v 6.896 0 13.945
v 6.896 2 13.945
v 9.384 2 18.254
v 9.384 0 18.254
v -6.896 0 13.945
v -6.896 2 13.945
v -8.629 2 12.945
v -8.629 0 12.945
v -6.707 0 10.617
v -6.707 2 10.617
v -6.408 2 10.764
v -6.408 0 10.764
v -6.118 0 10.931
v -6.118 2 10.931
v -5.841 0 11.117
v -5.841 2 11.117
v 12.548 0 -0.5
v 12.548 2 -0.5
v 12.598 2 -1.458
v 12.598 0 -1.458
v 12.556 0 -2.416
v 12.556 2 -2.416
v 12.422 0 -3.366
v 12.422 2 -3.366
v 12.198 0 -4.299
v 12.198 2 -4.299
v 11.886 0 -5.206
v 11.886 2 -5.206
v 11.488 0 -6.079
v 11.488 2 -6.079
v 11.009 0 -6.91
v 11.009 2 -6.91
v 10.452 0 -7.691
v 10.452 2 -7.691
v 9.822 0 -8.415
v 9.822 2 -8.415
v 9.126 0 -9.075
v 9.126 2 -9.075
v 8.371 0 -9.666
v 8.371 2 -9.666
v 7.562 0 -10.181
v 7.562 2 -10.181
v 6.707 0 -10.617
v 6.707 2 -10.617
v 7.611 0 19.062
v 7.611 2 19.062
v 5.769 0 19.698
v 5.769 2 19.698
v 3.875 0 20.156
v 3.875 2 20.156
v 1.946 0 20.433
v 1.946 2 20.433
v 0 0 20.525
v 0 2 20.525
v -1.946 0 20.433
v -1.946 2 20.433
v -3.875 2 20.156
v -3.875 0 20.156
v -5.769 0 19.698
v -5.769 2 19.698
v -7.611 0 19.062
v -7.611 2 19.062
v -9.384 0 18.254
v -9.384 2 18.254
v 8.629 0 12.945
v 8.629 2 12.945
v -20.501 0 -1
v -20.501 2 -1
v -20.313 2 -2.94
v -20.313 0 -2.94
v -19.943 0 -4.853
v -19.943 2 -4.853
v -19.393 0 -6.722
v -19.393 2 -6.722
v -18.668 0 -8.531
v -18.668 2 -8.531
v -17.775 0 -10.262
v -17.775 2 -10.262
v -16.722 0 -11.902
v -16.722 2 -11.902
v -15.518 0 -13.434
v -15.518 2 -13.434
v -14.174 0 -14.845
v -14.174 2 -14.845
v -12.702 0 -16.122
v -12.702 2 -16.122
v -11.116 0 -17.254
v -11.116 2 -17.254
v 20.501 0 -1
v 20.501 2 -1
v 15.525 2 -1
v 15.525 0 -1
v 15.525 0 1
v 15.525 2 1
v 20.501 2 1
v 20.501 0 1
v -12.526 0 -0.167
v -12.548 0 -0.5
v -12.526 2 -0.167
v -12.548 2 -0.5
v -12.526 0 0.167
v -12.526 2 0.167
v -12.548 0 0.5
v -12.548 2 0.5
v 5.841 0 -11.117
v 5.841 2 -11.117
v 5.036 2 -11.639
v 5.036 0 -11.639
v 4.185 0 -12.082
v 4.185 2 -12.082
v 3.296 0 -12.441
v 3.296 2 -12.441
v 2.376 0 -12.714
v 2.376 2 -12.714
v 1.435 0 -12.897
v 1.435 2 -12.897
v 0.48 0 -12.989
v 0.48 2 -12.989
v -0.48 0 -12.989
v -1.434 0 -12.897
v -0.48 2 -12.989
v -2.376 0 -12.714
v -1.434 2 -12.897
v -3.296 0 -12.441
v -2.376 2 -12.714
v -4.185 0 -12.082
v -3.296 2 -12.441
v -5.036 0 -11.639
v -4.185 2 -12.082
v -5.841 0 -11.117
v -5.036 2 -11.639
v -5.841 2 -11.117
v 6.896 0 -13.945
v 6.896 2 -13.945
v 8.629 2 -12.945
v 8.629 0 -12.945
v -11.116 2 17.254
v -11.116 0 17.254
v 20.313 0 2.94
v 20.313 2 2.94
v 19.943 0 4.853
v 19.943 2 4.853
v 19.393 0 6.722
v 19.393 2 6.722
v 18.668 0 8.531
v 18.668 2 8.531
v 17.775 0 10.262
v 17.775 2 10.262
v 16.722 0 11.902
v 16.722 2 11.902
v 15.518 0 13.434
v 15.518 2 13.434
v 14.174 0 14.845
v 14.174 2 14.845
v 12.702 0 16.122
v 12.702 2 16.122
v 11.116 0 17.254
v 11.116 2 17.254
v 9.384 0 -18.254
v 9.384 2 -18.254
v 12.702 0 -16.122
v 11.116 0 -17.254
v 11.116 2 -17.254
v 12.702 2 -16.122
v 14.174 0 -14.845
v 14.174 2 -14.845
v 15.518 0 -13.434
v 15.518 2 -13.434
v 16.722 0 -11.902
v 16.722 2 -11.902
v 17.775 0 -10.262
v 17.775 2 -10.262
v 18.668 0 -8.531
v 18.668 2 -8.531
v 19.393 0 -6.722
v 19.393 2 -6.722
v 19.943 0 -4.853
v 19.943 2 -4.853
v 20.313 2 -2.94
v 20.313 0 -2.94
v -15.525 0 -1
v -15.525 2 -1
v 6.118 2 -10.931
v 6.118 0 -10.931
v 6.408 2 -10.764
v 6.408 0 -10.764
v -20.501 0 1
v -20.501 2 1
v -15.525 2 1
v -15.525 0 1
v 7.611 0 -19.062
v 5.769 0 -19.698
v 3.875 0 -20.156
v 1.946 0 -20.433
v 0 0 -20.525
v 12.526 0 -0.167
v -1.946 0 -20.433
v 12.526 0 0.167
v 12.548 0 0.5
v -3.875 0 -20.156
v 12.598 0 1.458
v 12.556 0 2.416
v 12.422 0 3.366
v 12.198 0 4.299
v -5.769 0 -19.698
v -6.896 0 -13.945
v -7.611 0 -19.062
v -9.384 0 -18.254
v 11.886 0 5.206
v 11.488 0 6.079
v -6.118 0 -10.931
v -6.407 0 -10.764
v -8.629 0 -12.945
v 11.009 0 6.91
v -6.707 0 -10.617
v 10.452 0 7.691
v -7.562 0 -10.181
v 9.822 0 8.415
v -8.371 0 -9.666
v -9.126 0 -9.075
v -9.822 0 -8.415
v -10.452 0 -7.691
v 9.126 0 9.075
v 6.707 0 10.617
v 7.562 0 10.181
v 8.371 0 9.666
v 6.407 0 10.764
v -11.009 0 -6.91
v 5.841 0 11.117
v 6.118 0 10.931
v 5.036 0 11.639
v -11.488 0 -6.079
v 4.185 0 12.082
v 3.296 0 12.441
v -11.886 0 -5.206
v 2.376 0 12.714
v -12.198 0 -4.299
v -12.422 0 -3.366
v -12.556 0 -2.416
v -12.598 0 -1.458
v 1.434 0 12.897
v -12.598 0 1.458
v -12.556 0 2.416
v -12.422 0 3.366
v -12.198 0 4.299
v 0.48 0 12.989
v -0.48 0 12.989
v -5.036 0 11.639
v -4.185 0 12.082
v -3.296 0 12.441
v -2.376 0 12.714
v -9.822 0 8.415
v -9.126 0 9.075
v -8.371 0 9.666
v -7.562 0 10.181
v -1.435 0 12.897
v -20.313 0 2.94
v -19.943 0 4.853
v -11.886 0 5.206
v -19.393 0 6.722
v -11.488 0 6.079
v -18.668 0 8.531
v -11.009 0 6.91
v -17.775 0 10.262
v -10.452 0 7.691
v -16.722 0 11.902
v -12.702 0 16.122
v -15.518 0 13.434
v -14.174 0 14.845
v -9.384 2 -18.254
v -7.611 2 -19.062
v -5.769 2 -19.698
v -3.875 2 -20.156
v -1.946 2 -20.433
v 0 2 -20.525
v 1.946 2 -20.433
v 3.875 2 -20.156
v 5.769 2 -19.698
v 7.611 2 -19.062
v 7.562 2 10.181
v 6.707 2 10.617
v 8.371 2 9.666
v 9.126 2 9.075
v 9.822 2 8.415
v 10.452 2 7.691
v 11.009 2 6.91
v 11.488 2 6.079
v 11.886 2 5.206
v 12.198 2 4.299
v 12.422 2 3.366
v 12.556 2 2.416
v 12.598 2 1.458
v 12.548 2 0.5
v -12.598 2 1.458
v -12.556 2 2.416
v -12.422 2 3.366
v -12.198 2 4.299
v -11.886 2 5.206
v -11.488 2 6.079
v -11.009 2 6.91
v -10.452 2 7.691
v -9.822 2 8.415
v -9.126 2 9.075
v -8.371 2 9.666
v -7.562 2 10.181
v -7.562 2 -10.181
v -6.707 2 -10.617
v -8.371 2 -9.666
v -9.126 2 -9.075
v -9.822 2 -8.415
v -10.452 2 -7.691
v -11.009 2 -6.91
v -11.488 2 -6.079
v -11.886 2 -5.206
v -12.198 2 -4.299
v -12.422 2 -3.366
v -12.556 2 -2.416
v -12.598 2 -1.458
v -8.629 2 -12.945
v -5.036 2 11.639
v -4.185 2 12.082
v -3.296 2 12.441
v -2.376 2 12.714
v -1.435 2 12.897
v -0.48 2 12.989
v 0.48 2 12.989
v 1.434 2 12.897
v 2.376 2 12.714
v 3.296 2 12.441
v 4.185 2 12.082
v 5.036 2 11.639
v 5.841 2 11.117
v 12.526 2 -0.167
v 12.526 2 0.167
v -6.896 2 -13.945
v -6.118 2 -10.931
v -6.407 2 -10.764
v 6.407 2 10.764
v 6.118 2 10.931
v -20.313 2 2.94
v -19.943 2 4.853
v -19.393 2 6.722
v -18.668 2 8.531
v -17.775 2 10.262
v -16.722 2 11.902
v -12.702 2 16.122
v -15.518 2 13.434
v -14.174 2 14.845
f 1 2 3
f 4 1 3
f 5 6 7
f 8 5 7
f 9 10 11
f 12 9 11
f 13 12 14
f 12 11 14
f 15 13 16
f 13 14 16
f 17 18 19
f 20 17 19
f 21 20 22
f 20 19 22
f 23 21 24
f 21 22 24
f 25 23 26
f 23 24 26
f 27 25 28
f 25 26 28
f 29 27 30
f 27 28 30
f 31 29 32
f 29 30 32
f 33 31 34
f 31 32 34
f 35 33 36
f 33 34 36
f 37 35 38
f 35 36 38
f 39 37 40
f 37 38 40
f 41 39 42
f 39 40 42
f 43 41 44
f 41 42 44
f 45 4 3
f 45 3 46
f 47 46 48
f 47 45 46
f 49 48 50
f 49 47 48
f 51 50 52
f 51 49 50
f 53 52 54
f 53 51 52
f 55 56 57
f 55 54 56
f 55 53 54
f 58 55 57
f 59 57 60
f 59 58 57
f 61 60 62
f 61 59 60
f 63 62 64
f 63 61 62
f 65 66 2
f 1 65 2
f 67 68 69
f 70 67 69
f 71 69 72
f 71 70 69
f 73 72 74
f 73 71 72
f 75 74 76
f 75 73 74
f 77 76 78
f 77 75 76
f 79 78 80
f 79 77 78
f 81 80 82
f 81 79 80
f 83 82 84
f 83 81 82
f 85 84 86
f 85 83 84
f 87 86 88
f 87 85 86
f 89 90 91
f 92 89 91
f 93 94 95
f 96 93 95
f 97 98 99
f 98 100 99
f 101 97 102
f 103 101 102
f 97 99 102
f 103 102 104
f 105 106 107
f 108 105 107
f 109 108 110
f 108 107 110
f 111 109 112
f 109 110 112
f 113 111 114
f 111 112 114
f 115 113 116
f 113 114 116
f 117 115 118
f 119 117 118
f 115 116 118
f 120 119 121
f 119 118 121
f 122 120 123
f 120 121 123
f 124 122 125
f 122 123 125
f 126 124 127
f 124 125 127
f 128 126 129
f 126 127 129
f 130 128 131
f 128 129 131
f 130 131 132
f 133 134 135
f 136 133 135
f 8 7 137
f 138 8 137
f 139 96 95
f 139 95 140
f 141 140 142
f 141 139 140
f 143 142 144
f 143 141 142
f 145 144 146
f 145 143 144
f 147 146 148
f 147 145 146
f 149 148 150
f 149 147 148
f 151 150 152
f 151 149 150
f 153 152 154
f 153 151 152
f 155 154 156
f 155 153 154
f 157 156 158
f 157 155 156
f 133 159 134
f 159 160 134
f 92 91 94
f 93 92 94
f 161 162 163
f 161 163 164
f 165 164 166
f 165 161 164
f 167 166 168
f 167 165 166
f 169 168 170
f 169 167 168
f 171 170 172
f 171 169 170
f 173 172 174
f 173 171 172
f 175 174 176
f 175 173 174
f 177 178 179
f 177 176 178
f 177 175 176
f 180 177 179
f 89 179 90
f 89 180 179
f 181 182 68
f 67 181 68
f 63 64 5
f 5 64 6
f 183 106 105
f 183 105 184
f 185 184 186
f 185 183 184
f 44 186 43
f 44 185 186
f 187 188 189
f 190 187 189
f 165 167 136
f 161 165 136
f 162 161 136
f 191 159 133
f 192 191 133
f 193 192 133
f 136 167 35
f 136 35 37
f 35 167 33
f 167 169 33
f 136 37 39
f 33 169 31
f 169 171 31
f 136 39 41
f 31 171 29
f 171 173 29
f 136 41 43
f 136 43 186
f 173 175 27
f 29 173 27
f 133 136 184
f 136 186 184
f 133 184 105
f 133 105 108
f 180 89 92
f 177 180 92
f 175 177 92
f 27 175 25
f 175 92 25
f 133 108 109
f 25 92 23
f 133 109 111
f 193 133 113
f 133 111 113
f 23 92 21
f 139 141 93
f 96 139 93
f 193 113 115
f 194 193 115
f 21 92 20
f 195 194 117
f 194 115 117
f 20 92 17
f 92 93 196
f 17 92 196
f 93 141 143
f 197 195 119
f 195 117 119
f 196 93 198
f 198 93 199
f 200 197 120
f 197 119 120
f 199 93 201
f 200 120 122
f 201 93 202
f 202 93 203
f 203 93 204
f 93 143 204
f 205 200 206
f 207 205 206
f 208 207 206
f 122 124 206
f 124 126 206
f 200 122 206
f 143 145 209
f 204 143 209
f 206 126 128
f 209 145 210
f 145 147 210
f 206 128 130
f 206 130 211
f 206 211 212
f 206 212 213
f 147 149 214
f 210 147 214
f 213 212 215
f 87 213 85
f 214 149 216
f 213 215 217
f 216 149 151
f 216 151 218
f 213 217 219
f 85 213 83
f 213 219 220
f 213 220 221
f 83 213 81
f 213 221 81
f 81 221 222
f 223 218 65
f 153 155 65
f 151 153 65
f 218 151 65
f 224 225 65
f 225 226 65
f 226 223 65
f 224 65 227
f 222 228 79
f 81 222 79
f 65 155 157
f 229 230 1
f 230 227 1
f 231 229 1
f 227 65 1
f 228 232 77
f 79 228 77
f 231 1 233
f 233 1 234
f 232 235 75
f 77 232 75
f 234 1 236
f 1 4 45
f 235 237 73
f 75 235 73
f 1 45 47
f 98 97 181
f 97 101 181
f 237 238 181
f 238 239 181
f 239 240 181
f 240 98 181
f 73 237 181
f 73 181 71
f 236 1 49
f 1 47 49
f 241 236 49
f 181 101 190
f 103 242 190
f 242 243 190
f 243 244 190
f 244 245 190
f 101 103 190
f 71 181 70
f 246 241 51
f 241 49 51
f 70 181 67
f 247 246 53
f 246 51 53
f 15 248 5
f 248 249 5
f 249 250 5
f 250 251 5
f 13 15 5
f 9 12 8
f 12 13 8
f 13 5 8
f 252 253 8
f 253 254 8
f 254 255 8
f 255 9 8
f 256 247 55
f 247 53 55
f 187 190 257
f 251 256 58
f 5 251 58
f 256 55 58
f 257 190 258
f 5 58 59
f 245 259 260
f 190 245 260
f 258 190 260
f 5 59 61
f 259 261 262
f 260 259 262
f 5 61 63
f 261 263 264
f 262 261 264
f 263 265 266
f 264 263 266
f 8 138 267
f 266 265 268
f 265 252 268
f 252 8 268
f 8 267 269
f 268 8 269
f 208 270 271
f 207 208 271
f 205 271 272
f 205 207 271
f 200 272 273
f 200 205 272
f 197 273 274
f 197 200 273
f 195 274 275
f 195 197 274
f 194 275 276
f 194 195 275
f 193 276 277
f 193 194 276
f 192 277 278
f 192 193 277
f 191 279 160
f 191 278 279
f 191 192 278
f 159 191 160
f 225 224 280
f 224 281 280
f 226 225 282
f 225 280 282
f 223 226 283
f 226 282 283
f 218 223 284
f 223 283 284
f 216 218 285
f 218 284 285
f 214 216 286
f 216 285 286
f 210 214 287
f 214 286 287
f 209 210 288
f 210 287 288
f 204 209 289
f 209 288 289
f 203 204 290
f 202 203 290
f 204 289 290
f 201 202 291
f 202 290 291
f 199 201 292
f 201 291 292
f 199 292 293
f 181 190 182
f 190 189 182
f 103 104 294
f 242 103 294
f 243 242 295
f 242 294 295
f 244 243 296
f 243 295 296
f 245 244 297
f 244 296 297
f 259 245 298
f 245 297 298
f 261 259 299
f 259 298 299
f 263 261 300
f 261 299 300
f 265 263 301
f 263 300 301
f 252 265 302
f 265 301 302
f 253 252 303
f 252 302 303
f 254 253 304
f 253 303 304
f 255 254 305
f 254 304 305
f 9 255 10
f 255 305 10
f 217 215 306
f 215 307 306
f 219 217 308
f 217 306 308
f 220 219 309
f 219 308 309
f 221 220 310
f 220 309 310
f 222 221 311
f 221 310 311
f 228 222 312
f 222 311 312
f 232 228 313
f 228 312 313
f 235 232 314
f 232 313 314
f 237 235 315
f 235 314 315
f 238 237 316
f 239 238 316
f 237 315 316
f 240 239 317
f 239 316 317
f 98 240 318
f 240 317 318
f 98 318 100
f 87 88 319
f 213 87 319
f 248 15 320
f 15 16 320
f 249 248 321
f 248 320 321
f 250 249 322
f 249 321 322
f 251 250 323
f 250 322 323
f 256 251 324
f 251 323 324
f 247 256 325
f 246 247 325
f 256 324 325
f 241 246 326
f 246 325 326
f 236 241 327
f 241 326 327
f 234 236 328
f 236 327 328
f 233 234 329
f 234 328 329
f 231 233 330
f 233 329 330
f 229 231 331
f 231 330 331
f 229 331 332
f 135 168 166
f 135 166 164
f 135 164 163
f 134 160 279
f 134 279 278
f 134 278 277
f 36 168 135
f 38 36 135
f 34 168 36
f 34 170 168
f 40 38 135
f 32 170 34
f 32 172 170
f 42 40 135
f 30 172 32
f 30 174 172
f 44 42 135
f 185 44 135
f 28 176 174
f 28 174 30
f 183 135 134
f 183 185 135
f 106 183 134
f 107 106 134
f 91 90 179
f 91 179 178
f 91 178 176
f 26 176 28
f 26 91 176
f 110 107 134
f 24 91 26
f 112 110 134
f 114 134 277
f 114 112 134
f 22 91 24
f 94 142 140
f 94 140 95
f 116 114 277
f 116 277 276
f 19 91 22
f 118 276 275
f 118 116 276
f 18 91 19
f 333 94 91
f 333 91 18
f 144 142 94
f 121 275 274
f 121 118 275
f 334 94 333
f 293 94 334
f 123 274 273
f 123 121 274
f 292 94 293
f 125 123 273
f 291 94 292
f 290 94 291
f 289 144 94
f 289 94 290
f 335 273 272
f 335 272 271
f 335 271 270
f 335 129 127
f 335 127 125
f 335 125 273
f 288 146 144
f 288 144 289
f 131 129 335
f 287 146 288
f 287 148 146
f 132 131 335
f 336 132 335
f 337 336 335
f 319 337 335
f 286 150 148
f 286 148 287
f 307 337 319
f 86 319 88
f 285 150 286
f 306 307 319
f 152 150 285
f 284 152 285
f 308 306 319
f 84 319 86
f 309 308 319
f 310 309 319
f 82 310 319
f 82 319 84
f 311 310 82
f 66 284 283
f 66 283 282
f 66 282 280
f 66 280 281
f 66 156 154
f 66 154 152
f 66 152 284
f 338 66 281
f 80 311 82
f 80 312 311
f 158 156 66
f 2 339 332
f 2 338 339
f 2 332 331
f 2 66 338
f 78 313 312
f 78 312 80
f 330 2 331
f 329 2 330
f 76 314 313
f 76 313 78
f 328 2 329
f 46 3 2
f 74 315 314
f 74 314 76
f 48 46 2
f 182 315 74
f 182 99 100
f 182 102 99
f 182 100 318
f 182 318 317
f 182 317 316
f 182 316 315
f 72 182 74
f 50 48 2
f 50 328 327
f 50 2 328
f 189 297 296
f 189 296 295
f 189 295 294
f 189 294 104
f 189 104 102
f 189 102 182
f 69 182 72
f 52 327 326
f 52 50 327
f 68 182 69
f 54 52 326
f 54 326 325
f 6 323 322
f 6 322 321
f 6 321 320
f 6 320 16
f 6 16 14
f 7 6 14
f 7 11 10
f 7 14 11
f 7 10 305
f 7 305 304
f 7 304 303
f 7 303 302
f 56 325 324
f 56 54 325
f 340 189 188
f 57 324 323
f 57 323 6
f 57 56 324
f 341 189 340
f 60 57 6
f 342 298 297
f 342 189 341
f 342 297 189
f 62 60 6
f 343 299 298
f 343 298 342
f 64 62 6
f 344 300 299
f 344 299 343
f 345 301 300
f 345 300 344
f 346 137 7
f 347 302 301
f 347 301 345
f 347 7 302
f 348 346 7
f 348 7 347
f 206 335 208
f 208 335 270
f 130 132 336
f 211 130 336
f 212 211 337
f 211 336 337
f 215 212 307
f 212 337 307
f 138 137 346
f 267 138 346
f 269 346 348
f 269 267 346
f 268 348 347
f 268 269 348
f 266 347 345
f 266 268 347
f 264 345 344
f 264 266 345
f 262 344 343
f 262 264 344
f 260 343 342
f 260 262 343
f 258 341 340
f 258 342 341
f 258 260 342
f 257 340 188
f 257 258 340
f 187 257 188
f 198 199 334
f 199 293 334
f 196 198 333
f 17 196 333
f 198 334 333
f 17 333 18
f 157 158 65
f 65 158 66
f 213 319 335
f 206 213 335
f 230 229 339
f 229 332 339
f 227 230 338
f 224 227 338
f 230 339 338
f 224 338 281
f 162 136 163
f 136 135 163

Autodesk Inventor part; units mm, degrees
ref_plane "YZ Plane" through (0, 0, 0) normal (1, 0, 0) x (0, 1, 0)
ref_plane "XZ Plane" through (0, 0, 0) normal (0, 1, 0) x (-1, 0, 0)
ref_plane "XY Plane" through (0, 0, 0) normal (0, 0, 1) x (1, 0, 0)
sketch "Sketch1" plane through (0, 0, 0) normal (0, 1, 0) x (-1, 0, 0)
  circle A0 centre (0, 0) radius 20.525
  circle A1 centre (0, 0) radius 10.525
  dimension "d0" = 41.05
  dimension "d1" = 21.05
extrude "Extrusion1" add sketch "Sketch1" along normal blind 2
sketch "Sketch2" plane through (0, 2, 0) normal (0, 1, 0) x (1, 0, 0)
  line L0 (-25.525, -1) -> (-15.525, -1)
  line L1 (-15.525, -1) -> (-15.525, 1)
  line L2 (-15.525, 1) -> (-25.525, 1)
  line L3 (-25.525, 1) -> (-25.525, -1)
  point P0 (0, 0)
  dimension "d4" = 1
  dimension "d5" = 2
  dimension "d6" = 10
  dimension "d7" = 15.525
extrude "Extrusion2" cut sketch "Sketch2" against normal blind 2
pattern_circular "Circular Pattern1" count 6 over 360 about axis through (0, -10, 0) along (0, 1, 0) of "Extrusion2"
sketch "Sketch3" plane through (0, 2, 0) normal (0, 1, 0) x (1, 0, 0)
  circle A0 centre (-2.5981, -1.5) radius 10
  line L0 (-2.5981, -1.5) -> (0, 0) construction
  line L1 (-34.9729, 0) -> (29.7462, 0) projected
  dimension "d13" = 20
  dimension "d14" = 30
  dimension "d15" = 1.5
extrude "Extrusion3" cut sketch "Sketch3" against normal blind 2
pattern_circular "Circular Pattern2" count 6 over 360 about axis through (0, -10, 0) along (0, 1, 0) of "Extrusion3"
fillet "Fillet1" radius 5 6 edges at (-6.2425, 1, -10.8123) (-12.4849, 1, 0) (6.2425, 1, -10.8123) (-6.2425, 1, 10.8123) (6.2425, 1, 10.8123) (12.4849, 1, 0)
properties part number "Ring_n5"
